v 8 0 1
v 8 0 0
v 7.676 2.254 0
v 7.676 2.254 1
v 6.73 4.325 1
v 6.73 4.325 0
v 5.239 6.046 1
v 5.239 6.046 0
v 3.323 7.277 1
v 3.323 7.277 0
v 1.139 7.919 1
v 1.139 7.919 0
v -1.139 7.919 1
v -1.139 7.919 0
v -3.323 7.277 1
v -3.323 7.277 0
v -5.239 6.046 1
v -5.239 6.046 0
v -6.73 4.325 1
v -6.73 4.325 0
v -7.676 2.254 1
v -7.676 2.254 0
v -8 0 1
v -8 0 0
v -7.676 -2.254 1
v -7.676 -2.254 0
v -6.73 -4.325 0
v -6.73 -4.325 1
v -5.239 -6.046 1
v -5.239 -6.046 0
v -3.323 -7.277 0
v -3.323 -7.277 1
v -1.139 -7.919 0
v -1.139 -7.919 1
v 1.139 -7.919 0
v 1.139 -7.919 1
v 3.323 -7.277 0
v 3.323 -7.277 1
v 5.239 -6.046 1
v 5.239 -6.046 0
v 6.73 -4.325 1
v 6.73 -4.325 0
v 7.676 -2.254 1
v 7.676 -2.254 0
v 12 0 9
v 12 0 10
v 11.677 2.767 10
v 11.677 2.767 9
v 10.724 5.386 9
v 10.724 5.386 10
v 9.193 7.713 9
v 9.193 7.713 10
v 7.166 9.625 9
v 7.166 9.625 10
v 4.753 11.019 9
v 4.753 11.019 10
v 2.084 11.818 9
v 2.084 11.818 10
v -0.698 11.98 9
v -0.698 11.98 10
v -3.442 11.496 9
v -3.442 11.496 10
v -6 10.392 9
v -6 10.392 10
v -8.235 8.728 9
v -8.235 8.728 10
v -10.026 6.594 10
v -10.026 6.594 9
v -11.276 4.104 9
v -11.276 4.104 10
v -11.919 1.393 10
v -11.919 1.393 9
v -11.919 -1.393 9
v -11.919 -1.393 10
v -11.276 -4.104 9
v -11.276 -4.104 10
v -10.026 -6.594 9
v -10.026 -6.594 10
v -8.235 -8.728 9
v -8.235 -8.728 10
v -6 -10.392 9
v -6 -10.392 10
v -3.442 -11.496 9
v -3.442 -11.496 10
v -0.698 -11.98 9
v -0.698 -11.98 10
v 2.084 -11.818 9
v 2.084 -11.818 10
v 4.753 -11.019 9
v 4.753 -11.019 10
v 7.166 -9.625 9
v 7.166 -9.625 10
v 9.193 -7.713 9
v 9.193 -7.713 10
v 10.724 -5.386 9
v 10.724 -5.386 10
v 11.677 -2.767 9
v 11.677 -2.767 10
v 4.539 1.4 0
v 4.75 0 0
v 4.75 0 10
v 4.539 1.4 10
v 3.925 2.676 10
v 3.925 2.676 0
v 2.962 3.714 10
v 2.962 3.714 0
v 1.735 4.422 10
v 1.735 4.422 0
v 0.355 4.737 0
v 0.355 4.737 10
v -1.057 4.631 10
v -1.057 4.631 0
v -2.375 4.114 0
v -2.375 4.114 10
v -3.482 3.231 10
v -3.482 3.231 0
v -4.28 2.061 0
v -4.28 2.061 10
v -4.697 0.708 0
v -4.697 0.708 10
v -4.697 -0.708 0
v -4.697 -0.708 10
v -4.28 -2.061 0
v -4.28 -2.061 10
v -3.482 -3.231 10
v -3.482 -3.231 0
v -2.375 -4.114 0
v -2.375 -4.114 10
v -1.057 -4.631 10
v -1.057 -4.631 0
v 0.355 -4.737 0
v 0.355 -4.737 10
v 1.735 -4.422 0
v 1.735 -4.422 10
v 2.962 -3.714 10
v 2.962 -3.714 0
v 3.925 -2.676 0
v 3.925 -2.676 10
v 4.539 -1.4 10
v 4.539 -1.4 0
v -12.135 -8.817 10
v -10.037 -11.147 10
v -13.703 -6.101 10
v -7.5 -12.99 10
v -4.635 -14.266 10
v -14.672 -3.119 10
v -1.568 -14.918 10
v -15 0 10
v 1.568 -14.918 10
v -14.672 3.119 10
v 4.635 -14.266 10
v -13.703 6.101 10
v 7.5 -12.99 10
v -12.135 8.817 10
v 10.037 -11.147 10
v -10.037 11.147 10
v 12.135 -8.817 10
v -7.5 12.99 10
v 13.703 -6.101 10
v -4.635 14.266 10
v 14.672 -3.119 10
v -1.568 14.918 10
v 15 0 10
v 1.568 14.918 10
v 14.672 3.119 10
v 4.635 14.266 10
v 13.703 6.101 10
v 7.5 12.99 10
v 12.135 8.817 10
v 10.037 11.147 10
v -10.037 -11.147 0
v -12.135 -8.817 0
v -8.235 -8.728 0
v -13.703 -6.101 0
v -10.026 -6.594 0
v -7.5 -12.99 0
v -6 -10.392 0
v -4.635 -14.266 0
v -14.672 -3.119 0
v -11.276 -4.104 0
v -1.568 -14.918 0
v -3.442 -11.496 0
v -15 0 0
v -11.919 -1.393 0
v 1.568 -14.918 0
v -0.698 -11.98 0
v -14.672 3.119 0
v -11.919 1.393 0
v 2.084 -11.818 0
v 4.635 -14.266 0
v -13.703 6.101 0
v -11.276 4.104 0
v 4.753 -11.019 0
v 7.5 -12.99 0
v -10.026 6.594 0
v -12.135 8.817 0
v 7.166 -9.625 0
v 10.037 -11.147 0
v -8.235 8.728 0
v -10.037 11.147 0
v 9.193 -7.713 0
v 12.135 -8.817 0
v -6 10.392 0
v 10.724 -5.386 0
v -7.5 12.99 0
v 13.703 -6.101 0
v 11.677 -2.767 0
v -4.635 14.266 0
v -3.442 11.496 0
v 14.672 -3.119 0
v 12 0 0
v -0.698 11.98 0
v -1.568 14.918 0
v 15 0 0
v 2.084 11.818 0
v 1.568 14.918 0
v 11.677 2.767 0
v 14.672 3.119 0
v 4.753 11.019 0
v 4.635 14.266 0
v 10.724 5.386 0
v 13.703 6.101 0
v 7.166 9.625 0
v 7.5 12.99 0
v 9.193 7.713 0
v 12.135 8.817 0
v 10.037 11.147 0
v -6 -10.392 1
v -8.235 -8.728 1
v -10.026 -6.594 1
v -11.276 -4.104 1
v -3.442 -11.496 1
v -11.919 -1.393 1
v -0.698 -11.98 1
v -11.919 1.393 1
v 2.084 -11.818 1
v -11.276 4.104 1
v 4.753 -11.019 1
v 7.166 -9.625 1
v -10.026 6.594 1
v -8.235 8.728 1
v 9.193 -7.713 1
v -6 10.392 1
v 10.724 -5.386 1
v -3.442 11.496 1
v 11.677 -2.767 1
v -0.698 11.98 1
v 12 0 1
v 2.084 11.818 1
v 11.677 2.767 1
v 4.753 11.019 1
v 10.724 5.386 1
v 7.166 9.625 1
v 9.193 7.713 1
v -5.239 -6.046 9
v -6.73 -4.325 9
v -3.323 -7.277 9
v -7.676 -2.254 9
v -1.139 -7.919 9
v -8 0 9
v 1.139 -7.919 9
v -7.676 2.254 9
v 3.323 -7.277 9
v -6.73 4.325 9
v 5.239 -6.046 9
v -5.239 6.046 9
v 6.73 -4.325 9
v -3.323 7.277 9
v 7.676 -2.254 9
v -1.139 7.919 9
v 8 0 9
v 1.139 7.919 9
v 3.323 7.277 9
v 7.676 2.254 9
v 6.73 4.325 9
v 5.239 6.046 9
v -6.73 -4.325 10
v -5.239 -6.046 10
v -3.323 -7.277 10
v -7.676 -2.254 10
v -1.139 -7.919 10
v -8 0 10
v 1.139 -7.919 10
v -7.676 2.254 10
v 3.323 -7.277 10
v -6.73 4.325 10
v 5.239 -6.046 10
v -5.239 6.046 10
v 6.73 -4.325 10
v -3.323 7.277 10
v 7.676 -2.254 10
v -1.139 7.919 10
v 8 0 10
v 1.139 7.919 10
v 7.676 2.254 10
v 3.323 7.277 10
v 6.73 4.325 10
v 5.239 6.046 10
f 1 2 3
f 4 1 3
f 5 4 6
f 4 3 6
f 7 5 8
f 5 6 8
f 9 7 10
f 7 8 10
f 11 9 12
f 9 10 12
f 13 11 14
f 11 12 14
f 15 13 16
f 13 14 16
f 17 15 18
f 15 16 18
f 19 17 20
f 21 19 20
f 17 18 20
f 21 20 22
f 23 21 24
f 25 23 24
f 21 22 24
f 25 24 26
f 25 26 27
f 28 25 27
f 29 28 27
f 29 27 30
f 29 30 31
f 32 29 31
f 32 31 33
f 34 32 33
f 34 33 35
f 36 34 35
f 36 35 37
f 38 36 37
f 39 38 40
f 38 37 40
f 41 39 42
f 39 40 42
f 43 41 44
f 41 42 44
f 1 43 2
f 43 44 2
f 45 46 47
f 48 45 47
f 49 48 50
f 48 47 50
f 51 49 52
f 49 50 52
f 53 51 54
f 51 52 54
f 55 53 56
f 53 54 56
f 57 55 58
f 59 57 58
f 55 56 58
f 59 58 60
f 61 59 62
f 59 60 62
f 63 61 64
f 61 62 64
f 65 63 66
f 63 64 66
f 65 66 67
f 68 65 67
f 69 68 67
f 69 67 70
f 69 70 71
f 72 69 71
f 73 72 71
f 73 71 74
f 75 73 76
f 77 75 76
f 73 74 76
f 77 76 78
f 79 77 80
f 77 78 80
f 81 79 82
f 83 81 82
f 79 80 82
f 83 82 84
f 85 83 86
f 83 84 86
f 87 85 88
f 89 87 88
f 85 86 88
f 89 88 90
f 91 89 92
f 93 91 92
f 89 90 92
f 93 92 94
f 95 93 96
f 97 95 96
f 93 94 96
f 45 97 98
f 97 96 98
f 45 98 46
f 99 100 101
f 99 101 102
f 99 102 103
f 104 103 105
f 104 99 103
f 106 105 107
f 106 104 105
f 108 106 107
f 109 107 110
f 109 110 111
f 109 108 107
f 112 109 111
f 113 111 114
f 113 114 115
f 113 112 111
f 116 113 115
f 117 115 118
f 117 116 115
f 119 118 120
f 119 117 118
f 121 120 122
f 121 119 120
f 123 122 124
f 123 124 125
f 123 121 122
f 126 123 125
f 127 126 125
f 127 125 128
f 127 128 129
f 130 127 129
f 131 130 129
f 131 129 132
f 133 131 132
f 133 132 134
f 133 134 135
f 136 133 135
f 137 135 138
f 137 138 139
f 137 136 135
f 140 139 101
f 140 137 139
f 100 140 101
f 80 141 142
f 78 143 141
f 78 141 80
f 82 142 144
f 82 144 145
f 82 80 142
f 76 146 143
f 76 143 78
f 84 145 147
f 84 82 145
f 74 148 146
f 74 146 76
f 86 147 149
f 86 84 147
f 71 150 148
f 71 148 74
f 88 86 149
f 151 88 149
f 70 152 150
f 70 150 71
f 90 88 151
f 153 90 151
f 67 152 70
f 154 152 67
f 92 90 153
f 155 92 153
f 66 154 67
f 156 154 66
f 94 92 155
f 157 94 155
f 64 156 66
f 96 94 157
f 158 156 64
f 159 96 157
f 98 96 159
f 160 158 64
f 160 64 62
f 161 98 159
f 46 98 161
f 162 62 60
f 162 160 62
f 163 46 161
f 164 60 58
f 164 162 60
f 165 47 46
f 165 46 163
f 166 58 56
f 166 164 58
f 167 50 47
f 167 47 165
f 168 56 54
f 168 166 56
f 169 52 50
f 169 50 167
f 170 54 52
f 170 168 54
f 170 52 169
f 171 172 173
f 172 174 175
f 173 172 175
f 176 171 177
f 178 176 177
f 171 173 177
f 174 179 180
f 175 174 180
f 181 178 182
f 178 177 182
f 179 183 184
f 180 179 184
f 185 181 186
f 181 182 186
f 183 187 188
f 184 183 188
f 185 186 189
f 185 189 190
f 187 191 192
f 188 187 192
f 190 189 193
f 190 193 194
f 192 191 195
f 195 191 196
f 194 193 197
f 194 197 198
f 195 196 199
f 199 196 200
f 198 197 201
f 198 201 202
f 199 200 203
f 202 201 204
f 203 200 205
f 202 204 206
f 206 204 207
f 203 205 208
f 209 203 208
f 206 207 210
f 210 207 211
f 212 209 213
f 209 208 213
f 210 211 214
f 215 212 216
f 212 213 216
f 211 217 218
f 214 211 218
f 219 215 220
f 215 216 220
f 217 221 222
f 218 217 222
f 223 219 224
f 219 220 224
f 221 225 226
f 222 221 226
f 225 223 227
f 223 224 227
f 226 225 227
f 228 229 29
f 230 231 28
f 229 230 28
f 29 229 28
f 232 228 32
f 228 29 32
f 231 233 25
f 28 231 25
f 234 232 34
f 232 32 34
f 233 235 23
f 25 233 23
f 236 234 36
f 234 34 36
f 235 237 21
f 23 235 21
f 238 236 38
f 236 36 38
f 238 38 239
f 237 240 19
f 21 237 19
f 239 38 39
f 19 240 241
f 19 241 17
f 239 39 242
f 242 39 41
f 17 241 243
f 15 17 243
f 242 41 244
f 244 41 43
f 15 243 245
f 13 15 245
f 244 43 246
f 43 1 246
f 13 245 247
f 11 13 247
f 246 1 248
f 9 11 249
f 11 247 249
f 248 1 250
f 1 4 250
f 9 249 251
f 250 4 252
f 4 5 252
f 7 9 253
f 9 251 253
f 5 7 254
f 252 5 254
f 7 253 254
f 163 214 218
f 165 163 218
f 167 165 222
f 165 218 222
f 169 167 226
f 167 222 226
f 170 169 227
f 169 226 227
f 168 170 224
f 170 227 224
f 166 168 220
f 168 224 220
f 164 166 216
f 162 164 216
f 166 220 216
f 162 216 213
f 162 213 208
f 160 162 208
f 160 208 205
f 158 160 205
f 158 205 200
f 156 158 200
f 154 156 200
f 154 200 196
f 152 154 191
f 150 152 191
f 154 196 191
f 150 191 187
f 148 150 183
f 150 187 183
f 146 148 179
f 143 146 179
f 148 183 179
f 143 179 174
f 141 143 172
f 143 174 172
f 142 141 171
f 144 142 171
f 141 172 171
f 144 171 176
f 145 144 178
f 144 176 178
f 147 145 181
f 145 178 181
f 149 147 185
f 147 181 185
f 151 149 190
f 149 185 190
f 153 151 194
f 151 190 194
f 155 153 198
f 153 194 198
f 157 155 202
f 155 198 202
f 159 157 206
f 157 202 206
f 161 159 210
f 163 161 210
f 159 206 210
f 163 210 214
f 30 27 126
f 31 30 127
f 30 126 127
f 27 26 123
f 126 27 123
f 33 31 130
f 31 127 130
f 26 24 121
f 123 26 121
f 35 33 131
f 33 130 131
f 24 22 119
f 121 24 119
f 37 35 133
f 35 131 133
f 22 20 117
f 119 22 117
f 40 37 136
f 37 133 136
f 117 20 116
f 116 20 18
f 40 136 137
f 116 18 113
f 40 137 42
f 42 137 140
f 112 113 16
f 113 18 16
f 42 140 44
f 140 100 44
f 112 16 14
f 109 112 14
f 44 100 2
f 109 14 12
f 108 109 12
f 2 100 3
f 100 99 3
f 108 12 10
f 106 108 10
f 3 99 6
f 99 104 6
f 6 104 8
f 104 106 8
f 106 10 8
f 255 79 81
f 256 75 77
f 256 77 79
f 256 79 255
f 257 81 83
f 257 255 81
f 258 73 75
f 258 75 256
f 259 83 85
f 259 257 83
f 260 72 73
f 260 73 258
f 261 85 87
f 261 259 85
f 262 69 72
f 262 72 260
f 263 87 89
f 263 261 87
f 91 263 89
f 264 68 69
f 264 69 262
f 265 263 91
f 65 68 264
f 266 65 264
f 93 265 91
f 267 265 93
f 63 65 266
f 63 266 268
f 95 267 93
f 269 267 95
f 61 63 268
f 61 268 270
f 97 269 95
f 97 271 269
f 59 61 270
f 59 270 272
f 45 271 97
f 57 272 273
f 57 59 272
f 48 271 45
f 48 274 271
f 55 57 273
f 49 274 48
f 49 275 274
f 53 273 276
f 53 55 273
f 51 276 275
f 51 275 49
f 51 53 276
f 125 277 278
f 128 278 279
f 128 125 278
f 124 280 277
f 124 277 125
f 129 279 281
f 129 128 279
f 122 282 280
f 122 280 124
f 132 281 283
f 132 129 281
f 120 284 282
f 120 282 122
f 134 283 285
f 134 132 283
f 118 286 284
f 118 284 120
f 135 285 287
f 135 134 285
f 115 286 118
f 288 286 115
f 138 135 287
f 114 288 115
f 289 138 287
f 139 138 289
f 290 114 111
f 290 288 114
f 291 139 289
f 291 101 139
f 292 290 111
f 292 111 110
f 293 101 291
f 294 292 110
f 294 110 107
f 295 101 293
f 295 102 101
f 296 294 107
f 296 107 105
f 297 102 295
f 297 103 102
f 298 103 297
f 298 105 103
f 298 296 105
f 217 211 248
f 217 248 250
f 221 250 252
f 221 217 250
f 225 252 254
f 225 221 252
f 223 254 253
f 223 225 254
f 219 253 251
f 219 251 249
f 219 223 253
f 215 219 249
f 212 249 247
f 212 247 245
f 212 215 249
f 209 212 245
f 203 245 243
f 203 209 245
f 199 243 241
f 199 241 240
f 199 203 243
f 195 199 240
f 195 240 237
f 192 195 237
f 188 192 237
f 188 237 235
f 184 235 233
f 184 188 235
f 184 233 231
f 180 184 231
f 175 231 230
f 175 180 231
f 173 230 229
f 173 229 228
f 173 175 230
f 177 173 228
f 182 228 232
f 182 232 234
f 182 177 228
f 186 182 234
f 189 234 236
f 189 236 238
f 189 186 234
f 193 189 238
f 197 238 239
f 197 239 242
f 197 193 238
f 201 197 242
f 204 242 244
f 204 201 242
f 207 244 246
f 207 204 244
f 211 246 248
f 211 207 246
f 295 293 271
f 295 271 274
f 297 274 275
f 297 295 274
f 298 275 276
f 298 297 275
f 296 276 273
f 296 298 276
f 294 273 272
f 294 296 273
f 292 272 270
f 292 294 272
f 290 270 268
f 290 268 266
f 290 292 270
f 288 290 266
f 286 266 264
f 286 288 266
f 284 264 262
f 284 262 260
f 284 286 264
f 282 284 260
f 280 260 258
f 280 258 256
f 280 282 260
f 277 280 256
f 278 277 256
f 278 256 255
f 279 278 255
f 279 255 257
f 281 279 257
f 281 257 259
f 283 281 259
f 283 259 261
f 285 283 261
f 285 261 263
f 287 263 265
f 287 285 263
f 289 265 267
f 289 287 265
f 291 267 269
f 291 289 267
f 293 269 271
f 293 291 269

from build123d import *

# Parameters (mm, degrees)
SKETCH1_R           = 15
SKETCH1_R_2         = 4.75
BOSS_EXTRUDE1_DEPTH = 10
SKETCH2_R           = 12
SKETCH2_R_2         = 8
CUT_EXTRUDE1_DEPTH  = 1
SKETCH4_R           = 12
SKETCH4_R_2         = 8
CUT_EXTRUDE2_DEPTH  = 1


with BuildPart() as part:
    # Sketch1 → Boss-Extrude1 (new body)
    with BuildSketch(Plane.XY):
        Circle(SKETCH1_R)
        Circle(SKETCH1_R_2, mode=Mode.SUBTRACT)
    extrude(amount=BOSS_EXTRUDE1_DEPTH)

    # Sketch2 → Cut-Extrude1 (cut)
    with BuildSketch(Plane.XY):
        Circle(SKETCH2_R)
        Circle(SKETCH2_R_2, mode=Mode.SUBTRACT)
    extrude(amount=CUT_EXTRUDE1_DEPTH, mode=Mode.SUBTRACT)

    # Sketch4 → Cut-Extrude2 (cut)
    with BuildSketch(Plane.XY.offset(10)):
        Circle(SKETCH4_R)
        Circle(SKETCH4_R_2, mode=Mode.SUBTRACT)
    extrude(amount=-CUT_EXTRUDE2_DEPTH, mode=Mode.SUBTRACT)


solid = part.part
